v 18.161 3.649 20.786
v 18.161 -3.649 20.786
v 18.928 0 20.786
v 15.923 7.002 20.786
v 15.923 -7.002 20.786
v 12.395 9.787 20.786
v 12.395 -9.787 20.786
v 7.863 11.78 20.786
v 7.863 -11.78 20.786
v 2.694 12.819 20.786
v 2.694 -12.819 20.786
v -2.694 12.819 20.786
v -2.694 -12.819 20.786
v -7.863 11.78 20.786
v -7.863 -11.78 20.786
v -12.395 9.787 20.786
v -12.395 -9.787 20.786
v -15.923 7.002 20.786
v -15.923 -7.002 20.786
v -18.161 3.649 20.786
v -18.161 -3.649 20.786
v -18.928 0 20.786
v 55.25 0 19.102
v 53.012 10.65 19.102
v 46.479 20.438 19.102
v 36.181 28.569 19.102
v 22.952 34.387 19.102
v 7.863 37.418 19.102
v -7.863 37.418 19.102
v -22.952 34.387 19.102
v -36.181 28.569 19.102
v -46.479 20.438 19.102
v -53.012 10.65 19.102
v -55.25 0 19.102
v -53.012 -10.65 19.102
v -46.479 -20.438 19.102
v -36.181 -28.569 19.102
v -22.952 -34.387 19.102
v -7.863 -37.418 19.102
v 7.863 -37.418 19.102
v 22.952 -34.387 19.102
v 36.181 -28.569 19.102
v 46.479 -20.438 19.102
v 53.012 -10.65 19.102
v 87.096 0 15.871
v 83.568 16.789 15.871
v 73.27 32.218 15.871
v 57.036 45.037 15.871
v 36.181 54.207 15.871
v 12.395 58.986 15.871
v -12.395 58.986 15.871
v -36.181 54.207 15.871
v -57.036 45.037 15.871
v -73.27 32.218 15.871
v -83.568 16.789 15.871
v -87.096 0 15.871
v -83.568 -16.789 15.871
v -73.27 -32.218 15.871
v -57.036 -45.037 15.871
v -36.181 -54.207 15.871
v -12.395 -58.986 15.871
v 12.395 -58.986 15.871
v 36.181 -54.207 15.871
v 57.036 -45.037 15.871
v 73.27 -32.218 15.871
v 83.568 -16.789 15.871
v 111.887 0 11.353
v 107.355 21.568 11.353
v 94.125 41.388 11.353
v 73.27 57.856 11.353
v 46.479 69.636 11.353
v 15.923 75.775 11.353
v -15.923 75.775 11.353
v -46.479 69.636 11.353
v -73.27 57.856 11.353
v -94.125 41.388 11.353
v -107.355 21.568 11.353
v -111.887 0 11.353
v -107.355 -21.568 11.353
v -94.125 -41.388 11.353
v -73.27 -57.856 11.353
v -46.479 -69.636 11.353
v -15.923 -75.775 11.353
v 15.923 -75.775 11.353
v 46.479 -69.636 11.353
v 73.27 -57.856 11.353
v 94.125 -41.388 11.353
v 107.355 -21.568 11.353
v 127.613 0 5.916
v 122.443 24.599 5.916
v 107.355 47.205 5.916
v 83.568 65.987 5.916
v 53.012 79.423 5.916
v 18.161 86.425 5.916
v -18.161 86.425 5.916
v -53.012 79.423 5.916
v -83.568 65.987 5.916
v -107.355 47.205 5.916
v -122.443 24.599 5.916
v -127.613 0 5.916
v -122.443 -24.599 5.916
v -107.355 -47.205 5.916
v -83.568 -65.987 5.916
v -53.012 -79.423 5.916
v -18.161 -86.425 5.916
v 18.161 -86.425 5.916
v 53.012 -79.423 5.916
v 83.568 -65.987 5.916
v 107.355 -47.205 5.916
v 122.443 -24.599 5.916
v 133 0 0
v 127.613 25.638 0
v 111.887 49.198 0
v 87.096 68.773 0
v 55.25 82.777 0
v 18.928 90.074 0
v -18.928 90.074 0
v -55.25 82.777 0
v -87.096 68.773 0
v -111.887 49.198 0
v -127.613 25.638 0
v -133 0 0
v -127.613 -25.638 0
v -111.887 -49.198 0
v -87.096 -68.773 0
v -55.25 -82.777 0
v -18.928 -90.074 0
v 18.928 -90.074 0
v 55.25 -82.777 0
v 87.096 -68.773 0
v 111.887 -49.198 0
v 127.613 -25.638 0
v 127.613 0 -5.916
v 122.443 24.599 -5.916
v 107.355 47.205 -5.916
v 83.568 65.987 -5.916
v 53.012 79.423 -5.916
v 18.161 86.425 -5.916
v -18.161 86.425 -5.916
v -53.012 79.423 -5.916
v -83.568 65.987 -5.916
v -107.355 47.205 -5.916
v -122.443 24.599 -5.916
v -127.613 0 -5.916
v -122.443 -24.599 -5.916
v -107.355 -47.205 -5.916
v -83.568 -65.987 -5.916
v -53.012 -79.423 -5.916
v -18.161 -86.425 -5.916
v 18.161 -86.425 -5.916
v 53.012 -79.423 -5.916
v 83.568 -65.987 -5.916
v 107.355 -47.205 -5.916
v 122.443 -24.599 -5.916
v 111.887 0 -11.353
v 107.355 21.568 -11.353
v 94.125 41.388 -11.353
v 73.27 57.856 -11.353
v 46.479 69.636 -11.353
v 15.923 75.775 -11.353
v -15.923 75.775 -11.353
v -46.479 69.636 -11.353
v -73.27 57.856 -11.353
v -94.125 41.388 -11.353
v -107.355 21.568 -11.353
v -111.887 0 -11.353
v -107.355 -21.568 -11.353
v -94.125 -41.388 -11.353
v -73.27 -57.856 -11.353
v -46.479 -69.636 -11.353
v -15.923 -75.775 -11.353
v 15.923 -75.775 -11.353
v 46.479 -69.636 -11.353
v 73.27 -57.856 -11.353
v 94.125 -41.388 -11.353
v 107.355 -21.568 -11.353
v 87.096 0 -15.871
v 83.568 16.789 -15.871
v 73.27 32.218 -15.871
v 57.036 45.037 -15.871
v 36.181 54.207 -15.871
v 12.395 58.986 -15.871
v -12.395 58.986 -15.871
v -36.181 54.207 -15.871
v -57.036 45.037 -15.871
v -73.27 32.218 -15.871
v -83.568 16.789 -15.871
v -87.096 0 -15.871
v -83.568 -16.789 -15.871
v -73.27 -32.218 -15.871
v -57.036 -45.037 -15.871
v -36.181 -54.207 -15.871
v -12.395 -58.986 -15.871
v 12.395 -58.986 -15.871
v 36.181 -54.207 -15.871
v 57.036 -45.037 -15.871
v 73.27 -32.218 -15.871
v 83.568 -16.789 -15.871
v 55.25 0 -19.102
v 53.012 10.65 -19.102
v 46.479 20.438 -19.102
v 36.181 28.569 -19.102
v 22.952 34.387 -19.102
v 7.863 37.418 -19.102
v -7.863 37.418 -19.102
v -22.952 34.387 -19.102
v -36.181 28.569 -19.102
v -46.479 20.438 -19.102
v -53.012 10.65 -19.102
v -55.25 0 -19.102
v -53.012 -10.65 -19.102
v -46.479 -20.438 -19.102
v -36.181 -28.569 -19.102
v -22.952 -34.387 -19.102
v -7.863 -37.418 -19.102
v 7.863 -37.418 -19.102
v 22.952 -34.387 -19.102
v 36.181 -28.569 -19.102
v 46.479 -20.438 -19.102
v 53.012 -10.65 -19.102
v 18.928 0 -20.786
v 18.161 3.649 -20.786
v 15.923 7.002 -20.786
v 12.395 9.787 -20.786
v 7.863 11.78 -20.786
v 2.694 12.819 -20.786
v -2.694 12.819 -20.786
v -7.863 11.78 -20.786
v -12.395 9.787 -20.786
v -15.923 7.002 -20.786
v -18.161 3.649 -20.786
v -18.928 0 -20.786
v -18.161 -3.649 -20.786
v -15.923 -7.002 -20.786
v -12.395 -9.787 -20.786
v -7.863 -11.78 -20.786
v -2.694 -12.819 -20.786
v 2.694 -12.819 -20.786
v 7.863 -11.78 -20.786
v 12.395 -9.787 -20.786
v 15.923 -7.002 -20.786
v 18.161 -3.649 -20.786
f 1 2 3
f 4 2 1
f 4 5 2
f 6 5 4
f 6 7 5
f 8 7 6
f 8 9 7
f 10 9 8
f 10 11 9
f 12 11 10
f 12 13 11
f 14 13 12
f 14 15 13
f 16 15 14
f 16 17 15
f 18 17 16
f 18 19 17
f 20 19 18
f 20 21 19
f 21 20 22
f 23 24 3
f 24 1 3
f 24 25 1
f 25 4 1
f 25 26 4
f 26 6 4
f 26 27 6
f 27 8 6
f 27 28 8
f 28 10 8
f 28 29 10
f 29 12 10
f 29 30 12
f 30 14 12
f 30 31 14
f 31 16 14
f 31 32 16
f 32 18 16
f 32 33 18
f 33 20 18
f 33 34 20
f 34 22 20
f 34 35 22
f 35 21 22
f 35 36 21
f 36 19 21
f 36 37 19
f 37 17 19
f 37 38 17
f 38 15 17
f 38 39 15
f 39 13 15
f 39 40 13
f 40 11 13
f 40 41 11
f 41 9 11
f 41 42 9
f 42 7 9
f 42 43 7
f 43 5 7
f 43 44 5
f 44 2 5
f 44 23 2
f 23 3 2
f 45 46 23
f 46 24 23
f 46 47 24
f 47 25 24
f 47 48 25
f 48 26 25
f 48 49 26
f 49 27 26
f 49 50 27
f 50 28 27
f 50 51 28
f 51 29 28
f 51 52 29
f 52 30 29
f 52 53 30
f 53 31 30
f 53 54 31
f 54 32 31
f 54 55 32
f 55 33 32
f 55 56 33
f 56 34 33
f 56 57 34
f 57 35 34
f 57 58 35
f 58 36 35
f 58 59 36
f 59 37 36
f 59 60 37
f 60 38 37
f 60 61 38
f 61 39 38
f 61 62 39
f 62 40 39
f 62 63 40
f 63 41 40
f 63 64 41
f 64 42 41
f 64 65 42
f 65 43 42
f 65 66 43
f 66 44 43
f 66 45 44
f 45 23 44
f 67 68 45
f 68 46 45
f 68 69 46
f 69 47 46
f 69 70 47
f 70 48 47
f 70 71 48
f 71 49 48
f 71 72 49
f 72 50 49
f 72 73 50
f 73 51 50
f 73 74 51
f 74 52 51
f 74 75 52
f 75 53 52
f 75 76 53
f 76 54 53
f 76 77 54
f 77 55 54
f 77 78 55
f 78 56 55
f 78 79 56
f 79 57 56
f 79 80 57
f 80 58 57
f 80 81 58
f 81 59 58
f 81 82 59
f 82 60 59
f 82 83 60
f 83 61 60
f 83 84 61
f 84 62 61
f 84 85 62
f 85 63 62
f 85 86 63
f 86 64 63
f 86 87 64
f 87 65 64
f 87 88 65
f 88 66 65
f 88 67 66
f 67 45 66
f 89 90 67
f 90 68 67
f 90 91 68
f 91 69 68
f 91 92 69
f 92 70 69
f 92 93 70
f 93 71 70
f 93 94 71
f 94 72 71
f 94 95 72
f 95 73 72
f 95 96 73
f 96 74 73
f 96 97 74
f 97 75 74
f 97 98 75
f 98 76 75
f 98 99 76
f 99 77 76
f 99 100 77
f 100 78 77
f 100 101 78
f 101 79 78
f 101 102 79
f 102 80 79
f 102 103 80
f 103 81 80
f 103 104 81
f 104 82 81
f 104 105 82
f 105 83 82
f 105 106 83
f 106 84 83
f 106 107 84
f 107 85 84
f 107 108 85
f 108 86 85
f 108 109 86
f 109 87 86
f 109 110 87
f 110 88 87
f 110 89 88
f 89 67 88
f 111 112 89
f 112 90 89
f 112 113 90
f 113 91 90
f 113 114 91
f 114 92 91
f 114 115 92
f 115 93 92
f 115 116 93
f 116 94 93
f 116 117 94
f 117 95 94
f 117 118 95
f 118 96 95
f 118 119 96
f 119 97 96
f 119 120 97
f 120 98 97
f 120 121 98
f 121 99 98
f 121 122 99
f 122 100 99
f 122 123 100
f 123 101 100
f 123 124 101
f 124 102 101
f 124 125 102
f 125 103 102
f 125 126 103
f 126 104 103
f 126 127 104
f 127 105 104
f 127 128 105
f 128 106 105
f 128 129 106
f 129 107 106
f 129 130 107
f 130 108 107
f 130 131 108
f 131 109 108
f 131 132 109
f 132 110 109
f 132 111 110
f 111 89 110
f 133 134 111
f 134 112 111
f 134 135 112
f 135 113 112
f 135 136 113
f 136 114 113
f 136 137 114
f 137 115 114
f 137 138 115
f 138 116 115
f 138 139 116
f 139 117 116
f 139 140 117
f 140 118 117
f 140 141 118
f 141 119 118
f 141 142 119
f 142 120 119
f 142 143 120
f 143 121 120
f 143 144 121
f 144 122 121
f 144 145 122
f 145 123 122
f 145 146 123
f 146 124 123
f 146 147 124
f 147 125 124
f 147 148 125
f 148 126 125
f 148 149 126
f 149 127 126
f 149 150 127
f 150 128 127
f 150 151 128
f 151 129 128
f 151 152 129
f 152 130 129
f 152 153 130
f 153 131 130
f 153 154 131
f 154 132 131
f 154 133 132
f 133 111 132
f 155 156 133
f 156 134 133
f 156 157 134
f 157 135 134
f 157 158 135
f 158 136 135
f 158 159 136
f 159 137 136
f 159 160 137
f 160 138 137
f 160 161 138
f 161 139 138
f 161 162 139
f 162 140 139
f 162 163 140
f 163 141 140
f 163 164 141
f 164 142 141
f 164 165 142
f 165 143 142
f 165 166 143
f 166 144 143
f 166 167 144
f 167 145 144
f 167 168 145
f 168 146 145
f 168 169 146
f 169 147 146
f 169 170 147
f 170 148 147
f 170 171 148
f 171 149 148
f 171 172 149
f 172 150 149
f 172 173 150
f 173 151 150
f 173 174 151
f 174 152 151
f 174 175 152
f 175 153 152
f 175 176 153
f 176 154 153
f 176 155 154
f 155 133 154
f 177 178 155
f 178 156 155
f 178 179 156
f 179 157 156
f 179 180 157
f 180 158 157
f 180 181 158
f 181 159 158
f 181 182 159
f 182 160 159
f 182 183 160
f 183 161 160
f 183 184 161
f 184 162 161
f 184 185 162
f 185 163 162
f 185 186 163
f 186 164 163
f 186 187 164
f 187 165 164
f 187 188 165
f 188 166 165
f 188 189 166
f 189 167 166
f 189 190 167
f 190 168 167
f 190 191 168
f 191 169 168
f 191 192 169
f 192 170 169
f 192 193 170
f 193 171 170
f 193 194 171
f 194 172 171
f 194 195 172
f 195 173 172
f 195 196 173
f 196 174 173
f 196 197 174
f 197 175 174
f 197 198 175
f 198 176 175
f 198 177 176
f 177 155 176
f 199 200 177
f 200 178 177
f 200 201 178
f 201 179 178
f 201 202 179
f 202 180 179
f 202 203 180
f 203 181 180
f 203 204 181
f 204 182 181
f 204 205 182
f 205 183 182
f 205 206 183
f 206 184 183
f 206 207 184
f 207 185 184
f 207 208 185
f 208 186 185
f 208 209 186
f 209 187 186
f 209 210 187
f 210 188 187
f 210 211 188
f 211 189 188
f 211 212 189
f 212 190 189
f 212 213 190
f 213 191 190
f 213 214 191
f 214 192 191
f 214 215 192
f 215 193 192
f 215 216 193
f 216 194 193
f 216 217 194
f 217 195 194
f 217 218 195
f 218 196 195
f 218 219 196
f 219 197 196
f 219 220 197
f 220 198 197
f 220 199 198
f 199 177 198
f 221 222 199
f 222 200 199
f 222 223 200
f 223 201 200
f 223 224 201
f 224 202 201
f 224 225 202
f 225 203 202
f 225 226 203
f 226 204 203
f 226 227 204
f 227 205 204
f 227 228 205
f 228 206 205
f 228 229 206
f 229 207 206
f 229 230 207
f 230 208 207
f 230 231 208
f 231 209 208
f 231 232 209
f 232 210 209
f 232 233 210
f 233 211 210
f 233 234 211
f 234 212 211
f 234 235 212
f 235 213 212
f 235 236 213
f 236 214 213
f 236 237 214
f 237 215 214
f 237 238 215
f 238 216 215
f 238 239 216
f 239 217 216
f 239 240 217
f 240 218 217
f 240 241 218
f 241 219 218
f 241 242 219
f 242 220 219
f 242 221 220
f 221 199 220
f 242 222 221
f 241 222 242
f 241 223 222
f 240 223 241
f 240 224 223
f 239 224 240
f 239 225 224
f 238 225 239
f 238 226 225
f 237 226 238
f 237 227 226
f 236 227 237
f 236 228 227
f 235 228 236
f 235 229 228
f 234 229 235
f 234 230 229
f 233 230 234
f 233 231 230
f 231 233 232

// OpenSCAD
// Generated by SolidPython 1.0.1 on 2020-07-29 00:46:54


scale(v = [19, 13, 3]) {
	sphere(r = 7);
}
/***********************************************
*********      SolidPython code:      **********
************************************************
 
# import packages: SolidPython
from solid import *
from solid.utils import *
from itertools import chain, combinations, permutations


class Resize:

    def __init__(self, scad_file):
        self.scad_file = scad_file
        #self.scad_file = import_scad(scad_file)
        # cone/cylinder param:
        self.r1 = 0
        self.r2 = 0
        self.h = 0
        # rectangular prism param:
        self.w = 0
        self.l = 0
        # ellipse param:
        self.r = 0

    # import OpenScad code (file name corresponds to shape)


    # classify shape + parameters
    def assign(self, param1, param2, param3):
        if self.scad_file == 'cone.scad':
            self.r1 = param1
            self.r2 = param2
            self.h = param3
        elif self.scad_file == 'cylinder.scad':
            self.r1 = param1
            self.r2 = param2
            self.h = param3
        elif self.scad_file == 'rectangularPrism.scad':
            self.h = param1
            self.l = param2
            self.w = param3
        else:
            self.r = param1
            self.h = param2

    # resize parameters
    def iterate(self):
        x = range(3, 20, 2)
        i = 1
        if self.scad_file == 'cone.scad':
            tempList = list(permutations(x, 2))
            for temp in tempList:
                param1 = temp[0]
                param2 = temp[1]
                filepath = 'produced_scad_files/' + 'cone' + str(param1) + '_' + str(param2) + '_' + '.scad'
                scad_render_to_file(cylinder(h=param1, r1=param2, r2=0), filepath)

        elif self.scad_file == 'cylinder.scad':
            tempList = list(permutations(x, 3))
            for temp in tempList:
                param1 = temp[0]
                param2 = temp[1]
                filepath = 'produced_scad_files/' + 'cylinder' + str(param1) + '_' + str(param2) + '_' + '.scad'
                scad_render_to_file(cylinder(h=param1, r1=param2, r2=param2), filepath)

        elif self.scad_file == 'rectangularPrism.scad':
            tempList = list(permutations(x, 3))
            for temp in tempList:
                param1 = temp[0]
                param2 = temp[1]
                param3 = temp[2]
                filepath = 'produced_scad_files/' + 'rectangularPrism' + str(param1) + '_' + str(param2) + '_' + str(
                    param3) + '.scad'
                scad_render_to_file(cube(size=(param1, param2, param3)), filepath)

        elif self.scad_file == 'ellipse.scad':
            tempList = list(permutations(x, 4))
            for temp in tempList:
                param1 = temp[0]
                param2 = temp[1]
                param3 = temp[2]
                param4 = temp[3]
                filepath = 'produced_scad_files/' + 'ellipse' + str(param1) + '_' + str(param2) + '_' + str(param3) + '_' + str(param4) + '.scad'
                scad_render_to_file(scale([param1, param2, param3])(sphere(r=param4)), filepath)

    def render_to_scadfile(self):
        scad_render_to_file(scad, 'example.scad') 
 
************************************************/
